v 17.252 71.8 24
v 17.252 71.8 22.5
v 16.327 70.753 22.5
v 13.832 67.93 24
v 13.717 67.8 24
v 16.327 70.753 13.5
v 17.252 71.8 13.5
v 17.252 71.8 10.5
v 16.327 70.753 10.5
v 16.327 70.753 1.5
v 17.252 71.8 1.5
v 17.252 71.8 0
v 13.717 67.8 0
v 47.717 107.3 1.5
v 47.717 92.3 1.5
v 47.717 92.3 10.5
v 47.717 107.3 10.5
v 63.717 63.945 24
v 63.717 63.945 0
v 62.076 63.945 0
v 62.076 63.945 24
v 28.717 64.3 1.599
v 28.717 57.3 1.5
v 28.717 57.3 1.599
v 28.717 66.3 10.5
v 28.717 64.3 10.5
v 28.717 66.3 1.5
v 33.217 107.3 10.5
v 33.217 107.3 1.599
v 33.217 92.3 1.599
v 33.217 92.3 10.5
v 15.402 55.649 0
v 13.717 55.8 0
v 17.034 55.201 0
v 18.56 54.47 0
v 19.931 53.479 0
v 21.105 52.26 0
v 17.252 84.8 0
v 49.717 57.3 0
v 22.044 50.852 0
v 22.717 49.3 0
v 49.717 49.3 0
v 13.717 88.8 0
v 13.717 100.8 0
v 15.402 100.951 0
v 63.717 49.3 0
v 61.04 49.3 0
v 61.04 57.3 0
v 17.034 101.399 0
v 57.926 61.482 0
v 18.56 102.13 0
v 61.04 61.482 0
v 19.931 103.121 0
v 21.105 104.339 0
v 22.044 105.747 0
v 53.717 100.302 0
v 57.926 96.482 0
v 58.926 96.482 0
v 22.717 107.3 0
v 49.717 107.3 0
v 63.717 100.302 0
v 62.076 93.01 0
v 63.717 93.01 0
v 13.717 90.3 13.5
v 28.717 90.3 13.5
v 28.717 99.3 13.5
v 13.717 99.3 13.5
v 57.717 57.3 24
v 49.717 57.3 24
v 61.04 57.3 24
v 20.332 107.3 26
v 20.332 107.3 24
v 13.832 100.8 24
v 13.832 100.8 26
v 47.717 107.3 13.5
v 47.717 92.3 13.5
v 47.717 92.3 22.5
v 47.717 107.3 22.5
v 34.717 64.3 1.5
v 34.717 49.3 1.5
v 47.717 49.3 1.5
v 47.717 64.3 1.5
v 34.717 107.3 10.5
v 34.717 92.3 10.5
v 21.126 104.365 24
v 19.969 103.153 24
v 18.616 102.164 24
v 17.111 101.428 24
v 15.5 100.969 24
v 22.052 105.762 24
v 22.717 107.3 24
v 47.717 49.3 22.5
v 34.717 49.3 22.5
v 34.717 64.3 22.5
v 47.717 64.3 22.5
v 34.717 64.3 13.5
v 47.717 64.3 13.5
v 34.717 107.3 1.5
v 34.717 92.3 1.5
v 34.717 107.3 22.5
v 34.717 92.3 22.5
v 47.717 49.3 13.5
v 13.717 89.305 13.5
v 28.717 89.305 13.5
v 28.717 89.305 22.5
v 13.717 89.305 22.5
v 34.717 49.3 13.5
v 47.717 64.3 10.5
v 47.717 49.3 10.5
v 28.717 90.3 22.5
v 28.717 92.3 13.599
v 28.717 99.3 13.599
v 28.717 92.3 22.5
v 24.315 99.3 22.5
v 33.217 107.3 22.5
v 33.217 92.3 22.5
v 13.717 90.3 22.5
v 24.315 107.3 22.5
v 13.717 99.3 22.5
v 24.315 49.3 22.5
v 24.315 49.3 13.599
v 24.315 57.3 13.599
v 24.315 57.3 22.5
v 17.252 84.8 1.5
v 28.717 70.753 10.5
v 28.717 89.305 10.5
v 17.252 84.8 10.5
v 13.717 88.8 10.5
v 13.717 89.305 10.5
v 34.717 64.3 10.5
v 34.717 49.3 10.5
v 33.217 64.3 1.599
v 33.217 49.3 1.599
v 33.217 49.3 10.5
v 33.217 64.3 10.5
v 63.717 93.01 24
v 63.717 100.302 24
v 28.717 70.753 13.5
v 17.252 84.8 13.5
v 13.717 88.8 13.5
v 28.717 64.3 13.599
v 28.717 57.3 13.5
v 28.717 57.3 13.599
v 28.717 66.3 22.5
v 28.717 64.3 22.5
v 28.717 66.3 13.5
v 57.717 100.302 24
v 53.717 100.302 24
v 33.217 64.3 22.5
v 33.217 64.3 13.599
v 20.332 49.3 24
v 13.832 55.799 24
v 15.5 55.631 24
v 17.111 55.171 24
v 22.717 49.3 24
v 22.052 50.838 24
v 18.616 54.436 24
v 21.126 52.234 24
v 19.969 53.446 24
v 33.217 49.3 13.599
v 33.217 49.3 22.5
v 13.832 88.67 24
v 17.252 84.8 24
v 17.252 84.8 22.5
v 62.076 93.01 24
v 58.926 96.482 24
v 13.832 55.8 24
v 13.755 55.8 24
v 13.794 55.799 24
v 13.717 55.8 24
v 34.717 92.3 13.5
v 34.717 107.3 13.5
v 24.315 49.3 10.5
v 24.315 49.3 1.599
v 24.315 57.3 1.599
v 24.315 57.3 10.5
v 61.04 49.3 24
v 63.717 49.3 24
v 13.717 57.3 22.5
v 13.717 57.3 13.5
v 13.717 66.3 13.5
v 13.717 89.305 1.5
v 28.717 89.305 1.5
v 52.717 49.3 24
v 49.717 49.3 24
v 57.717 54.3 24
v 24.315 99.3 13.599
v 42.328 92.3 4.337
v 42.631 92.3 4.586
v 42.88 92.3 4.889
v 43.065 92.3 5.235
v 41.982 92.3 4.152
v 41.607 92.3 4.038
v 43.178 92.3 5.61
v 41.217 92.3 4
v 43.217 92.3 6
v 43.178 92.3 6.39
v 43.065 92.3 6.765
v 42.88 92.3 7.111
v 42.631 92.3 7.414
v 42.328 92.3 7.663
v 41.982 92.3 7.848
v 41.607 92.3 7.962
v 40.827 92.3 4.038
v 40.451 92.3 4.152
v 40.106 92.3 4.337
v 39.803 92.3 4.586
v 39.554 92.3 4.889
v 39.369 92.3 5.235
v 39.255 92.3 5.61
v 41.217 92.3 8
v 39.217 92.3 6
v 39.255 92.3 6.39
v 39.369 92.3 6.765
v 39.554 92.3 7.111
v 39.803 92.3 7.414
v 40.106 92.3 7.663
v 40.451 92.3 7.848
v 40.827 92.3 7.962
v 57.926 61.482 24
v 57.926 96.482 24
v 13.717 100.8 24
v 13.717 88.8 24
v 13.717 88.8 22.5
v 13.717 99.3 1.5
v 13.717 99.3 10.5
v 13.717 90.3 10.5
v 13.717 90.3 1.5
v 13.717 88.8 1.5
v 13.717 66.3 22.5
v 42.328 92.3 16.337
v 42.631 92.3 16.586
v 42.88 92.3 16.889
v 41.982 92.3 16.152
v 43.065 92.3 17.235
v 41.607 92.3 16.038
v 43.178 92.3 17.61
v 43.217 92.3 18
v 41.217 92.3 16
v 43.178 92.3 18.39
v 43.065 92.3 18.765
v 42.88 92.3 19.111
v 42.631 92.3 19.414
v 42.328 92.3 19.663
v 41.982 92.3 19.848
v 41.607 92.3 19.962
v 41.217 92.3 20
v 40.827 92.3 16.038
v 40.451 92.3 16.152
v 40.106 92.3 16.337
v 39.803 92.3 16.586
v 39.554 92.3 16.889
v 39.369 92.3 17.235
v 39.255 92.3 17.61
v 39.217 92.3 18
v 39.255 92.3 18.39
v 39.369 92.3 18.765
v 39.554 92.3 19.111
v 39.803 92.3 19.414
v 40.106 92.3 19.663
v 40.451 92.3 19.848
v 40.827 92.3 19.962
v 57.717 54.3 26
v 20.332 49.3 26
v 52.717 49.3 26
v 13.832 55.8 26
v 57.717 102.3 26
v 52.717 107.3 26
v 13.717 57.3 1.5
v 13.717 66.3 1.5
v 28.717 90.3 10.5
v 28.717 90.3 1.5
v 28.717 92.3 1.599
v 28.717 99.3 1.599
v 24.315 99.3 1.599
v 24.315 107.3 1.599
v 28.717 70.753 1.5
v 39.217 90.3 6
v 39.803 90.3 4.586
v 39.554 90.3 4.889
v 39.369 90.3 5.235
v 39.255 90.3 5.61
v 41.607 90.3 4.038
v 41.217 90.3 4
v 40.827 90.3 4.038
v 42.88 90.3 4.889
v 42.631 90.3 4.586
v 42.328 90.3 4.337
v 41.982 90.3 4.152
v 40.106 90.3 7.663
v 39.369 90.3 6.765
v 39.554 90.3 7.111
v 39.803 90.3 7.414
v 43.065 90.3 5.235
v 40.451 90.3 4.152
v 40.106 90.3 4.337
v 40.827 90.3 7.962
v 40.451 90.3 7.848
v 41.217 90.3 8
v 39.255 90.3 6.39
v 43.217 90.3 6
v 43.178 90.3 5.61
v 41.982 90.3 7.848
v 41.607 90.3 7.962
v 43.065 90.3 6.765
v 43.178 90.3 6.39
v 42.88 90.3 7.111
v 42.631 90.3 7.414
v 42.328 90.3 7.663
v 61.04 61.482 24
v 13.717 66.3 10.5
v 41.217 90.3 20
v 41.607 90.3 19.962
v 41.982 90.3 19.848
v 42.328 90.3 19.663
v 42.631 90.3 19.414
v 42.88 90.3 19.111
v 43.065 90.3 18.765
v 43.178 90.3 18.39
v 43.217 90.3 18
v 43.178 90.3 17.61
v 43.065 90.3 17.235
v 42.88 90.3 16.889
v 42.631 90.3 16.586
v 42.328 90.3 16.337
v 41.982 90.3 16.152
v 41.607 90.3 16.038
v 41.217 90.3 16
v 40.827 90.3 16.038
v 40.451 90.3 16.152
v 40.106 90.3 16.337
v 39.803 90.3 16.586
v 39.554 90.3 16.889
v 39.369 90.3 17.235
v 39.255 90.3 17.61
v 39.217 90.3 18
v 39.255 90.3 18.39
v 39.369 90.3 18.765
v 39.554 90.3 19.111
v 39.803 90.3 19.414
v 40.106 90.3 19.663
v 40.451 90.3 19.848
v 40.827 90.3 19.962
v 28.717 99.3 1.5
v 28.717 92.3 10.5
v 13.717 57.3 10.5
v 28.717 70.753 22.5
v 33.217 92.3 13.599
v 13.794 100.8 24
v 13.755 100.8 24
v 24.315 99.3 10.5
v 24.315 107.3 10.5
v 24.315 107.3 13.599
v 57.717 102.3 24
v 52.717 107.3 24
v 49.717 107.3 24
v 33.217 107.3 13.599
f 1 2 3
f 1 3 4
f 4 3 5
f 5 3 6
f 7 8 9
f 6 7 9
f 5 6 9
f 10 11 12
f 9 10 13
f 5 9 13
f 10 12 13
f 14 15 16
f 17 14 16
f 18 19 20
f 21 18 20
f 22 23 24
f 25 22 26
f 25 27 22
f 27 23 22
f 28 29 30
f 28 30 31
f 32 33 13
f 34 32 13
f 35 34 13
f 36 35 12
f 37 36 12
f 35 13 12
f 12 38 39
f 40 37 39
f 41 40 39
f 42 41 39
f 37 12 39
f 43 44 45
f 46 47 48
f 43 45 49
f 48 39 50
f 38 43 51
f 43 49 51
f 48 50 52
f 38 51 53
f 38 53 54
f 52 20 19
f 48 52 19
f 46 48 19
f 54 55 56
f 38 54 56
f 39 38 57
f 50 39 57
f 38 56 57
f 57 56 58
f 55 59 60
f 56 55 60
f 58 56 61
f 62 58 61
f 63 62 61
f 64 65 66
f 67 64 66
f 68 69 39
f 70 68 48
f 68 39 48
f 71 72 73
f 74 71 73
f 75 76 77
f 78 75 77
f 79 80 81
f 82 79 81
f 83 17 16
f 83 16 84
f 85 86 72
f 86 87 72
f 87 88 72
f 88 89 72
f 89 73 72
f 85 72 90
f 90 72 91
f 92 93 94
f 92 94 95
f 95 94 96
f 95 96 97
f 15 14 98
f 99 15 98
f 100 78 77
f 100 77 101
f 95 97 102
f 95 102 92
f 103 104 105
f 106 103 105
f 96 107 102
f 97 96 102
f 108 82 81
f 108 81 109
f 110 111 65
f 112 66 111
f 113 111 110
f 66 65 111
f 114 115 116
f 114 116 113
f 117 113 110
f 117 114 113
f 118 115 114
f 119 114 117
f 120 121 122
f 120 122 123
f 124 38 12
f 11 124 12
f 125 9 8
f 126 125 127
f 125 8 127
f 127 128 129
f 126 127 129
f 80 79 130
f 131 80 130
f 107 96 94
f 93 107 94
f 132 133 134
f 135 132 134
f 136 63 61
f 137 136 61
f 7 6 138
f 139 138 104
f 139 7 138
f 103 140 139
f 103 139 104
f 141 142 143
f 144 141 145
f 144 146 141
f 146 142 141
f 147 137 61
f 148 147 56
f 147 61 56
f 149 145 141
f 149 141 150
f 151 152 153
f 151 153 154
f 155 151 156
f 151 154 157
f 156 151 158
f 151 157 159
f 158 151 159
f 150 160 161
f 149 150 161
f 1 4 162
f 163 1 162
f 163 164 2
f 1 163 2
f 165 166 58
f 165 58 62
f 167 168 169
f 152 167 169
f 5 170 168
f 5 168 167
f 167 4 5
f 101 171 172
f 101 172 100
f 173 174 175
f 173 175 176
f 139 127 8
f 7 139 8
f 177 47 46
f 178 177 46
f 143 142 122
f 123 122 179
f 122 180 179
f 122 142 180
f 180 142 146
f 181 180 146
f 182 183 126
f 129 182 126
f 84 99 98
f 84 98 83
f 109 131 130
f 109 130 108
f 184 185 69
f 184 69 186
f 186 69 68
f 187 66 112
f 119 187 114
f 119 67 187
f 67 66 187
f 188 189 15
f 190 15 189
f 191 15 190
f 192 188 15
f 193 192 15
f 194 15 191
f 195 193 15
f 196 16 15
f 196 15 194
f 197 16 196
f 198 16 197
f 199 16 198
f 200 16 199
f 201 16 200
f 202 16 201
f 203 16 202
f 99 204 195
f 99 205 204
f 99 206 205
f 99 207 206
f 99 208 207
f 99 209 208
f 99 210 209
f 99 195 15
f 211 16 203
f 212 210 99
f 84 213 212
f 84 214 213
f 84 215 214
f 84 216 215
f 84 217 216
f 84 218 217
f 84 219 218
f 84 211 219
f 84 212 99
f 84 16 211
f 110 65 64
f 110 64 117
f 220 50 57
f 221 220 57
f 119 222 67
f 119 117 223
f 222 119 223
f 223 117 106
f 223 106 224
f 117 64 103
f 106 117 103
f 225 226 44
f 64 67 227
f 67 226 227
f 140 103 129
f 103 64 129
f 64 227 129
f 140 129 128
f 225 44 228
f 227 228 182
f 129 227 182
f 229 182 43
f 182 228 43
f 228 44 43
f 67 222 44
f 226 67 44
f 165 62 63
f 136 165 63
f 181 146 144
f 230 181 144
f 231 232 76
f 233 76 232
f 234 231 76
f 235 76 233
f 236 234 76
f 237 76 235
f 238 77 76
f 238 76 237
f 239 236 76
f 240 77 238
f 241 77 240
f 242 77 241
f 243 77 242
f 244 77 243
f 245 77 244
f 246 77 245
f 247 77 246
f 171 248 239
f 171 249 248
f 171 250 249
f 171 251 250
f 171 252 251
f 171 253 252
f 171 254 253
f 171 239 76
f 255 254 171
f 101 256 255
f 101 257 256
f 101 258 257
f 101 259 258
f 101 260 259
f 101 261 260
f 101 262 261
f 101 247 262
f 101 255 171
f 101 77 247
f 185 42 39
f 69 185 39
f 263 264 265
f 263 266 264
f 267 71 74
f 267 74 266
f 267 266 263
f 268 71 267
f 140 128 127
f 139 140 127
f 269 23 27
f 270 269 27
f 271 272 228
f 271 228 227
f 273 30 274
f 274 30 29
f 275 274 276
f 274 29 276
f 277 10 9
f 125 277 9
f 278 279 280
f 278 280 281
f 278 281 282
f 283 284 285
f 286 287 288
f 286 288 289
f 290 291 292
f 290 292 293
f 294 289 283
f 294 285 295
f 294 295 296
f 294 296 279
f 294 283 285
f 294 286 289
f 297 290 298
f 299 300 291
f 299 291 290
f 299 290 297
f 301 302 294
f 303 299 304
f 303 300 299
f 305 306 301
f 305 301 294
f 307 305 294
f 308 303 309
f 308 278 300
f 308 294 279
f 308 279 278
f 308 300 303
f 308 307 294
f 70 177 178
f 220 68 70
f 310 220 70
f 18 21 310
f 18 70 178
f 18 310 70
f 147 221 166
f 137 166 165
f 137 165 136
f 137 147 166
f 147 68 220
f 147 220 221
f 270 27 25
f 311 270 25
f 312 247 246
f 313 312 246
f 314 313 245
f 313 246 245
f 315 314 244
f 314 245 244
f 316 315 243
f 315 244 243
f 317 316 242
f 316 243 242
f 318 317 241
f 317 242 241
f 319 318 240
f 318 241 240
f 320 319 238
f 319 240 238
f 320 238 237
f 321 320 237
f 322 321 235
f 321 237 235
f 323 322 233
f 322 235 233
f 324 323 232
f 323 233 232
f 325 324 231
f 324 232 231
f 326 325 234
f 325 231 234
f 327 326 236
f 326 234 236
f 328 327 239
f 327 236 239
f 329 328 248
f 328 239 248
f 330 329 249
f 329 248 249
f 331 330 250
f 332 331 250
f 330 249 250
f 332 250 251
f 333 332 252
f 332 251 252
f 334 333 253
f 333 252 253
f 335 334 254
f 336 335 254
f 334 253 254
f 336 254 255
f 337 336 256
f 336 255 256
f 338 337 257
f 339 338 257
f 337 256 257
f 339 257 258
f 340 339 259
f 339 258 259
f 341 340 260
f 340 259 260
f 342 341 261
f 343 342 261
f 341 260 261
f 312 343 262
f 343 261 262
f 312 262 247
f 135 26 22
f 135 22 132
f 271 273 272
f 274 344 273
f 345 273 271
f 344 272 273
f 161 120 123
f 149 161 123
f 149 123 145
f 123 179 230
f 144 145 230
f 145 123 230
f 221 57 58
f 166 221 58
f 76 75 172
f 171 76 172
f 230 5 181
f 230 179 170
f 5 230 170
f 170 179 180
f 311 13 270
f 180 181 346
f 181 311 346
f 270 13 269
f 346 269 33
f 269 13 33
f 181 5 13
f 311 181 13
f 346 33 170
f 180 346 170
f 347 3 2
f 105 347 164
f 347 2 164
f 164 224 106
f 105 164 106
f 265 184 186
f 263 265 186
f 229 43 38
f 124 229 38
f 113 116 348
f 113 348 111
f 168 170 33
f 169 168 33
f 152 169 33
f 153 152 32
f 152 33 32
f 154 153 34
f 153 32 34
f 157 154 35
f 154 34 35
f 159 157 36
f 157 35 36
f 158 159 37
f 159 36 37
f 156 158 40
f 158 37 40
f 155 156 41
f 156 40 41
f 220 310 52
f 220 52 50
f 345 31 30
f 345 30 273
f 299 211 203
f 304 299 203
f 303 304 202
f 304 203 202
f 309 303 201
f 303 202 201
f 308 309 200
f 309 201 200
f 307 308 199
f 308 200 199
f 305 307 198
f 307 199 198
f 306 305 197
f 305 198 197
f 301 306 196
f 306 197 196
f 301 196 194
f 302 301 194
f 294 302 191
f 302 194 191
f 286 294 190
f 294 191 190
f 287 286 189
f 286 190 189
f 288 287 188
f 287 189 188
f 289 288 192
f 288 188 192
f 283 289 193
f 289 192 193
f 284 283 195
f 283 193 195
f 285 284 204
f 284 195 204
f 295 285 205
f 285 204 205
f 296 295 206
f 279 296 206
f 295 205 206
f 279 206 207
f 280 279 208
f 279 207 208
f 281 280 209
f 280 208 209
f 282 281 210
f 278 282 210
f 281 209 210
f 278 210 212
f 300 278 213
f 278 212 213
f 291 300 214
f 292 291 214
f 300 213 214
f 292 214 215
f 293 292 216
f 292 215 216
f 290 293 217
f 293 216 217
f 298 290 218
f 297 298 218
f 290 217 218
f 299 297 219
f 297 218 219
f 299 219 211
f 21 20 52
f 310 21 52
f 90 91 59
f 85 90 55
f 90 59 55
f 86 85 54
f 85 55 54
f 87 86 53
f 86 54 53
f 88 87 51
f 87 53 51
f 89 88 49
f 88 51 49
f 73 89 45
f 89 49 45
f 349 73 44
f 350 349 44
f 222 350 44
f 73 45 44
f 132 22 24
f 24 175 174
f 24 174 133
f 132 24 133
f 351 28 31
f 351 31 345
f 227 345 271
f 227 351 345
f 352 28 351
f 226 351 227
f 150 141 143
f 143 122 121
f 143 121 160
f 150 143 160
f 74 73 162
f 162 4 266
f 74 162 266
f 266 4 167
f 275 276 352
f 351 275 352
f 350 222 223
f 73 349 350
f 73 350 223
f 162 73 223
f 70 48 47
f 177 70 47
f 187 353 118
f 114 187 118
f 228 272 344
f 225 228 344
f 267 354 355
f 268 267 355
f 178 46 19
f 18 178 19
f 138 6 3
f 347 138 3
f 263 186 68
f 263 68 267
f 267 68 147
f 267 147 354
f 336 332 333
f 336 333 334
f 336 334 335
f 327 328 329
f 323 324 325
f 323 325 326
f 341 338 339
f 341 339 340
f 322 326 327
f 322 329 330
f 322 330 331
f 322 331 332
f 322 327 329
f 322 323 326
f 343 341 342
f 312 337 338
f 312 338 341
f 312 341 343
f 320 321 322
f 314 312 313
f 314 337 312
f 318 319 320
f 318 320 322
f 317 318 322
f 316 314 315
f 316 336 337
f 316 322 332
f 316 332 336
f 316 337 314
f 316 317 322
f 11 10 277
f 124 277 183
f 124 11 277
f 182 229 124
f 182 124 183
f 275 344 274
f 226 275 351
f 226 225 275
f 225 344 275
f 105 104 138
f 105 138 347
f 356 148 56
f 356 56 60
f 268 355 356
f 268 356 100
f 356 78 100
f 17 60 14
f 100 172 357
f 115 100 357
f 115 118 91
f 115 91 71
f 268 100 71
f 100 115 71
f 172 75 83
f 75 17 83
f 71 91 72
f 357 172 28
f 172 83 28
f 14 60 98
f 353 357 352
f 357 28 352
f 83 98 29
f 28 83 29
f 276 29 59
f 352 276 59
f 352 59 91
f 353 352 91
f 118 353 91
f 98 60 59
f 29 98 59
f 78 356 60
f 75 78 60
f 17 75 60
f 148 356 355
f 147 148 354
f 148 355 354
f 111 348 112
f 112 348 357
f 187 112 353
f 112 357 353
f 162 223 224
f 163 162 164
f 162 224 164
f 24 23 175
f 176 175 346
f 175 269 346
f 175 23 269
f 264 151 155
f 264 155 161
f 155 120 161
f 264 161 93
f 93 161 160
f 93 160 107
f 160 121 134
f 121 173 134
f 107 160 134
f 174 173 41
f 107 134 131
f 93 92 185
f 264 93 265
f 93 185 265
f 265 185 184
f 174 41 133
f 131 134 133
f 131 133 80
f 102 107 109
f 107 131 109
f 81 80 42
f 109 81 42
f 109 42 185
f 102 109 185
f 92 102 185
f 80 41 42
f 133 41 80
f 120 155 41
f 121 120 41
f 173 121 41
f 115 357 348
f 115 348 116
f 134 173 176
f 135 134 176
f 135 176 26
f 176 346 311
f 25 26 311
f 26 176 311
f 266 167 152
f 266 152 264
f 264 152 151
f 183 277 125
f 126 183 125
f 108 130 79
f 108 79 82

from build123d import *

# Parameters (mm, degrees)
EXTRUDE_2_DEPTH     = 24
SKETCH_4_W          = 8.901377932
SKETCH_4_H          = 8.901377932
SKETCH_4_W_2        = 13
SKETCH_4_H_2        = 9
CUT_EXTRUDE_3_DEPTH = 15
SKETCH_5_R          = 2
CUT_EXTRUDE_4_DEPTH = 2
SKETCH_6_W          = 8.901377932
SKETCH_6_H          = 8.901377932
SKETCH_6_W_2        = 13
SKETCH_6_H_2        = 9
CUT_EXTRUDE_5_DEPTH = 15
SKETCH_7_W          = 9
SKETCH_7_H          = 9
SKETCH_7_H_2        = 18.551992086
CUT_EXTRUDE_6_DEPTH = 15
EXTRUDE_3_DEPTH     = 2


with BuildPart() as part:
    # Эскиз1 → Вытянуть2 (new body)
    with BuildSketch(Plane.XY):
        with BuildLine():
            Line((53.716826077, 100.302263468), (49.716826077, 107.299731538))
            Line((49.716826077, 107.299731538), (43.716826077, 107.299731538))
            Line((43.716826077, 107.299731538), (22.716826077, 107.299731538))
            ThreePointArc((22.716826077, 107.299731538), (19.267726905, 102.594638084), (13.716826077, 100.799731538))
            Line((13.716826077, 100.799731538), (13.716826077, 88.799731538))
            Line((13.716826077, 88.799731538), (17.252144627, 84.799731538))
            Line((17.252144627, 84.799731538), (17.252144627, 71.799731538))
            Line((17.252144627, 71.799731538), (13.716826077, 67.799731538))
            Line((13.716826077, 67.799731538), (13.716826077, 55.799731538))
            ThreePointArc((13.716826077, 55.799731538), (19.267726905, 54.004824992), (22.716826077, 49.299731538))
            Line((22.716826077, 49.299731538), (49.716826077, 49.299731538))
            Line((49.716826077, 49.299731538), (49.716826077, 57.299731538))
            Line((49.716826077, 57.299731538), (61.039926278, 57.299731538))
            Line((61.039926278, 57.299731538), (61.039926278, 49.299731538))
            Line((61.039926278, 49.299731538), (63.716826077, 49.299731538))
            Line((63.716826077, 49.299731538), (63.716826077, 57.299731538))
            Line((63.716826077, 57.299731538), (63.716826077, 63.945130452))
            Line((63.716826077, 63.945130452), (62.075665924, 63.945130452))
            Line((62.075665924, 63.945130452), (61.039926278, 61.482439413))
            Line((61.039926278, 61.482439413), (57.925918002, 61.482439413))
            Line((57.925918002, 61.482439413), (57.925918002, 96.482439413))
            Line((57.925918002, 96.482439413), (58.925918002, 96.482439413))
            Line((58.925918002, 96.482439413), (62.075665924, 93.009879938))
            Line((62.075665924, 93.009879938), (63.716826077, 93.009879938))
            Line((63.716826077, 93.009879938), (63.716826077, 100.302263468))
            Line((63.716826077, 100.302263468), (53.716826077, 100.302263468))
        make_face()
    extrude(amount=EXTRUDE_2_DEPTH)

    # Эскиз4 → Вырез-Вытянуть3 (cut)
    with BuildSketch(Plane(origin=(0, 107.299731538, 0), x_dir=(-1, 0, 0), z_dir=(0, 1, 0))):
        with Locations((-28.766137111, 6.049311034)):
            Rectangle(SKETCH_4_W, SKETCH_4_H)
        with Locations((-28.766137111, 18.049311034)):
            Rectangle(SKETCH_4_W, SKETCH_4_H)
        with Locations((-41.216826077, 18)):
            Rectangle(SKETCH_4_W_2, SKETCH_4_H_2)
        with Locations((-41.216826077, 6)):
            Rectangle(SKETCH_4_W_2, SKETCH_4_H_2)
    extrude(amount=-CUT_EXTRUDE_3_DEPTH, mode=Mode.SUBTRACT)

    # Эскиз5 → Вырез-Вытянуть4 (cut)
    with BuildSketch(Plane(origin=(0, 92.299731538, 0), x_dir=(-1, 0, 0), z_dir=(0, 1, 0))):
        with Locations(Location((-41.216826077, 18, 0), (0, 0, 90))):
            Circle(SKETCH_5_R)
        with Locations(Location((-41.216826077, 6, 0), (0, 0, 90))):
            Circle(SKETCH_5_R)
    extrude(amount=-CUT_EXTRUDE_4_DEPTH, mode=Mode.SUBTRACT)

    # Эскиз6 → Вырез-Вытянуть5 (cut)
    with BuildSketch(Plane.XZ.offset(-49.299731538)):
        with Locations((28.766137111, 6.049311034)):
            Rectangle(SKETCH_6_W, SKETCH_6_H)
        with Locations((41.216826077, 6)):
            Rectangle(SKETCH_6_W_2, SKETCH_6_H_2)
        with Locations((41.216826077, 18)):
            Rectangle(SKETCH_6_W_2, SKETCH_6_H_2)
        with Locations((28.766137111, 18.049311034)):
            Rectangle(SKETCH_6_W, SKETCH_6_H)
    extrude(amount=-CUT_EXTRUDE_5_DEPTH, mode=Mode.SUBTRACT)

    # Эскиз7 → Вырез-Вытянуть6 (cut)
    with BuildSketch(Plane.ZY.offset(-13.716826077)):
        with Locations((18, 94.799731538)):
            Rectangle(SKETCH_7_W, SKETCH_7_H)
        with Locations((18, 61.799731538)):
            Rectangle(SKETCH_7_W, SKETCH_7_H)
        with Locations((6, 94.799731538)):
            Rectangle(SKETCH_7_W, SKETCH_7_H)
        with Locations((6, 61.799731538)):
            Rectangle(SKETCH_7_W, SKETCH_7_H)
        with Locations((6, 80.02885964)):
            Rectangle(SKETCH_7_W, SKETCH_7_H_2)
        with Locations((18, 80.02885964)):
            Rectangle(SKETCH_7_W, SKETCH_7_H_2)
    extrude(amount=-CUT_EXTRUDE_6_DEPTH, mode=Mode.SUBTRACT)

    # Эскиз8 → Вытянуть3 (add)
    with BuildSketch(Plane.XY.offset(24)):
        Polygon((20.331732254, 49.299731538), (52.716931495, 49.299731538), (57.716931495, 54.299731538), (57.716931495, 102.299731538), (52.716931495, 107.299731538), (20.331732254, 107.299731538), (13.831732254, 100.799731538), (13.831732254, 55.799731538), align=None)
    extrude(amount=EXTRUDE_3_DEPTH)


solid = part.part
